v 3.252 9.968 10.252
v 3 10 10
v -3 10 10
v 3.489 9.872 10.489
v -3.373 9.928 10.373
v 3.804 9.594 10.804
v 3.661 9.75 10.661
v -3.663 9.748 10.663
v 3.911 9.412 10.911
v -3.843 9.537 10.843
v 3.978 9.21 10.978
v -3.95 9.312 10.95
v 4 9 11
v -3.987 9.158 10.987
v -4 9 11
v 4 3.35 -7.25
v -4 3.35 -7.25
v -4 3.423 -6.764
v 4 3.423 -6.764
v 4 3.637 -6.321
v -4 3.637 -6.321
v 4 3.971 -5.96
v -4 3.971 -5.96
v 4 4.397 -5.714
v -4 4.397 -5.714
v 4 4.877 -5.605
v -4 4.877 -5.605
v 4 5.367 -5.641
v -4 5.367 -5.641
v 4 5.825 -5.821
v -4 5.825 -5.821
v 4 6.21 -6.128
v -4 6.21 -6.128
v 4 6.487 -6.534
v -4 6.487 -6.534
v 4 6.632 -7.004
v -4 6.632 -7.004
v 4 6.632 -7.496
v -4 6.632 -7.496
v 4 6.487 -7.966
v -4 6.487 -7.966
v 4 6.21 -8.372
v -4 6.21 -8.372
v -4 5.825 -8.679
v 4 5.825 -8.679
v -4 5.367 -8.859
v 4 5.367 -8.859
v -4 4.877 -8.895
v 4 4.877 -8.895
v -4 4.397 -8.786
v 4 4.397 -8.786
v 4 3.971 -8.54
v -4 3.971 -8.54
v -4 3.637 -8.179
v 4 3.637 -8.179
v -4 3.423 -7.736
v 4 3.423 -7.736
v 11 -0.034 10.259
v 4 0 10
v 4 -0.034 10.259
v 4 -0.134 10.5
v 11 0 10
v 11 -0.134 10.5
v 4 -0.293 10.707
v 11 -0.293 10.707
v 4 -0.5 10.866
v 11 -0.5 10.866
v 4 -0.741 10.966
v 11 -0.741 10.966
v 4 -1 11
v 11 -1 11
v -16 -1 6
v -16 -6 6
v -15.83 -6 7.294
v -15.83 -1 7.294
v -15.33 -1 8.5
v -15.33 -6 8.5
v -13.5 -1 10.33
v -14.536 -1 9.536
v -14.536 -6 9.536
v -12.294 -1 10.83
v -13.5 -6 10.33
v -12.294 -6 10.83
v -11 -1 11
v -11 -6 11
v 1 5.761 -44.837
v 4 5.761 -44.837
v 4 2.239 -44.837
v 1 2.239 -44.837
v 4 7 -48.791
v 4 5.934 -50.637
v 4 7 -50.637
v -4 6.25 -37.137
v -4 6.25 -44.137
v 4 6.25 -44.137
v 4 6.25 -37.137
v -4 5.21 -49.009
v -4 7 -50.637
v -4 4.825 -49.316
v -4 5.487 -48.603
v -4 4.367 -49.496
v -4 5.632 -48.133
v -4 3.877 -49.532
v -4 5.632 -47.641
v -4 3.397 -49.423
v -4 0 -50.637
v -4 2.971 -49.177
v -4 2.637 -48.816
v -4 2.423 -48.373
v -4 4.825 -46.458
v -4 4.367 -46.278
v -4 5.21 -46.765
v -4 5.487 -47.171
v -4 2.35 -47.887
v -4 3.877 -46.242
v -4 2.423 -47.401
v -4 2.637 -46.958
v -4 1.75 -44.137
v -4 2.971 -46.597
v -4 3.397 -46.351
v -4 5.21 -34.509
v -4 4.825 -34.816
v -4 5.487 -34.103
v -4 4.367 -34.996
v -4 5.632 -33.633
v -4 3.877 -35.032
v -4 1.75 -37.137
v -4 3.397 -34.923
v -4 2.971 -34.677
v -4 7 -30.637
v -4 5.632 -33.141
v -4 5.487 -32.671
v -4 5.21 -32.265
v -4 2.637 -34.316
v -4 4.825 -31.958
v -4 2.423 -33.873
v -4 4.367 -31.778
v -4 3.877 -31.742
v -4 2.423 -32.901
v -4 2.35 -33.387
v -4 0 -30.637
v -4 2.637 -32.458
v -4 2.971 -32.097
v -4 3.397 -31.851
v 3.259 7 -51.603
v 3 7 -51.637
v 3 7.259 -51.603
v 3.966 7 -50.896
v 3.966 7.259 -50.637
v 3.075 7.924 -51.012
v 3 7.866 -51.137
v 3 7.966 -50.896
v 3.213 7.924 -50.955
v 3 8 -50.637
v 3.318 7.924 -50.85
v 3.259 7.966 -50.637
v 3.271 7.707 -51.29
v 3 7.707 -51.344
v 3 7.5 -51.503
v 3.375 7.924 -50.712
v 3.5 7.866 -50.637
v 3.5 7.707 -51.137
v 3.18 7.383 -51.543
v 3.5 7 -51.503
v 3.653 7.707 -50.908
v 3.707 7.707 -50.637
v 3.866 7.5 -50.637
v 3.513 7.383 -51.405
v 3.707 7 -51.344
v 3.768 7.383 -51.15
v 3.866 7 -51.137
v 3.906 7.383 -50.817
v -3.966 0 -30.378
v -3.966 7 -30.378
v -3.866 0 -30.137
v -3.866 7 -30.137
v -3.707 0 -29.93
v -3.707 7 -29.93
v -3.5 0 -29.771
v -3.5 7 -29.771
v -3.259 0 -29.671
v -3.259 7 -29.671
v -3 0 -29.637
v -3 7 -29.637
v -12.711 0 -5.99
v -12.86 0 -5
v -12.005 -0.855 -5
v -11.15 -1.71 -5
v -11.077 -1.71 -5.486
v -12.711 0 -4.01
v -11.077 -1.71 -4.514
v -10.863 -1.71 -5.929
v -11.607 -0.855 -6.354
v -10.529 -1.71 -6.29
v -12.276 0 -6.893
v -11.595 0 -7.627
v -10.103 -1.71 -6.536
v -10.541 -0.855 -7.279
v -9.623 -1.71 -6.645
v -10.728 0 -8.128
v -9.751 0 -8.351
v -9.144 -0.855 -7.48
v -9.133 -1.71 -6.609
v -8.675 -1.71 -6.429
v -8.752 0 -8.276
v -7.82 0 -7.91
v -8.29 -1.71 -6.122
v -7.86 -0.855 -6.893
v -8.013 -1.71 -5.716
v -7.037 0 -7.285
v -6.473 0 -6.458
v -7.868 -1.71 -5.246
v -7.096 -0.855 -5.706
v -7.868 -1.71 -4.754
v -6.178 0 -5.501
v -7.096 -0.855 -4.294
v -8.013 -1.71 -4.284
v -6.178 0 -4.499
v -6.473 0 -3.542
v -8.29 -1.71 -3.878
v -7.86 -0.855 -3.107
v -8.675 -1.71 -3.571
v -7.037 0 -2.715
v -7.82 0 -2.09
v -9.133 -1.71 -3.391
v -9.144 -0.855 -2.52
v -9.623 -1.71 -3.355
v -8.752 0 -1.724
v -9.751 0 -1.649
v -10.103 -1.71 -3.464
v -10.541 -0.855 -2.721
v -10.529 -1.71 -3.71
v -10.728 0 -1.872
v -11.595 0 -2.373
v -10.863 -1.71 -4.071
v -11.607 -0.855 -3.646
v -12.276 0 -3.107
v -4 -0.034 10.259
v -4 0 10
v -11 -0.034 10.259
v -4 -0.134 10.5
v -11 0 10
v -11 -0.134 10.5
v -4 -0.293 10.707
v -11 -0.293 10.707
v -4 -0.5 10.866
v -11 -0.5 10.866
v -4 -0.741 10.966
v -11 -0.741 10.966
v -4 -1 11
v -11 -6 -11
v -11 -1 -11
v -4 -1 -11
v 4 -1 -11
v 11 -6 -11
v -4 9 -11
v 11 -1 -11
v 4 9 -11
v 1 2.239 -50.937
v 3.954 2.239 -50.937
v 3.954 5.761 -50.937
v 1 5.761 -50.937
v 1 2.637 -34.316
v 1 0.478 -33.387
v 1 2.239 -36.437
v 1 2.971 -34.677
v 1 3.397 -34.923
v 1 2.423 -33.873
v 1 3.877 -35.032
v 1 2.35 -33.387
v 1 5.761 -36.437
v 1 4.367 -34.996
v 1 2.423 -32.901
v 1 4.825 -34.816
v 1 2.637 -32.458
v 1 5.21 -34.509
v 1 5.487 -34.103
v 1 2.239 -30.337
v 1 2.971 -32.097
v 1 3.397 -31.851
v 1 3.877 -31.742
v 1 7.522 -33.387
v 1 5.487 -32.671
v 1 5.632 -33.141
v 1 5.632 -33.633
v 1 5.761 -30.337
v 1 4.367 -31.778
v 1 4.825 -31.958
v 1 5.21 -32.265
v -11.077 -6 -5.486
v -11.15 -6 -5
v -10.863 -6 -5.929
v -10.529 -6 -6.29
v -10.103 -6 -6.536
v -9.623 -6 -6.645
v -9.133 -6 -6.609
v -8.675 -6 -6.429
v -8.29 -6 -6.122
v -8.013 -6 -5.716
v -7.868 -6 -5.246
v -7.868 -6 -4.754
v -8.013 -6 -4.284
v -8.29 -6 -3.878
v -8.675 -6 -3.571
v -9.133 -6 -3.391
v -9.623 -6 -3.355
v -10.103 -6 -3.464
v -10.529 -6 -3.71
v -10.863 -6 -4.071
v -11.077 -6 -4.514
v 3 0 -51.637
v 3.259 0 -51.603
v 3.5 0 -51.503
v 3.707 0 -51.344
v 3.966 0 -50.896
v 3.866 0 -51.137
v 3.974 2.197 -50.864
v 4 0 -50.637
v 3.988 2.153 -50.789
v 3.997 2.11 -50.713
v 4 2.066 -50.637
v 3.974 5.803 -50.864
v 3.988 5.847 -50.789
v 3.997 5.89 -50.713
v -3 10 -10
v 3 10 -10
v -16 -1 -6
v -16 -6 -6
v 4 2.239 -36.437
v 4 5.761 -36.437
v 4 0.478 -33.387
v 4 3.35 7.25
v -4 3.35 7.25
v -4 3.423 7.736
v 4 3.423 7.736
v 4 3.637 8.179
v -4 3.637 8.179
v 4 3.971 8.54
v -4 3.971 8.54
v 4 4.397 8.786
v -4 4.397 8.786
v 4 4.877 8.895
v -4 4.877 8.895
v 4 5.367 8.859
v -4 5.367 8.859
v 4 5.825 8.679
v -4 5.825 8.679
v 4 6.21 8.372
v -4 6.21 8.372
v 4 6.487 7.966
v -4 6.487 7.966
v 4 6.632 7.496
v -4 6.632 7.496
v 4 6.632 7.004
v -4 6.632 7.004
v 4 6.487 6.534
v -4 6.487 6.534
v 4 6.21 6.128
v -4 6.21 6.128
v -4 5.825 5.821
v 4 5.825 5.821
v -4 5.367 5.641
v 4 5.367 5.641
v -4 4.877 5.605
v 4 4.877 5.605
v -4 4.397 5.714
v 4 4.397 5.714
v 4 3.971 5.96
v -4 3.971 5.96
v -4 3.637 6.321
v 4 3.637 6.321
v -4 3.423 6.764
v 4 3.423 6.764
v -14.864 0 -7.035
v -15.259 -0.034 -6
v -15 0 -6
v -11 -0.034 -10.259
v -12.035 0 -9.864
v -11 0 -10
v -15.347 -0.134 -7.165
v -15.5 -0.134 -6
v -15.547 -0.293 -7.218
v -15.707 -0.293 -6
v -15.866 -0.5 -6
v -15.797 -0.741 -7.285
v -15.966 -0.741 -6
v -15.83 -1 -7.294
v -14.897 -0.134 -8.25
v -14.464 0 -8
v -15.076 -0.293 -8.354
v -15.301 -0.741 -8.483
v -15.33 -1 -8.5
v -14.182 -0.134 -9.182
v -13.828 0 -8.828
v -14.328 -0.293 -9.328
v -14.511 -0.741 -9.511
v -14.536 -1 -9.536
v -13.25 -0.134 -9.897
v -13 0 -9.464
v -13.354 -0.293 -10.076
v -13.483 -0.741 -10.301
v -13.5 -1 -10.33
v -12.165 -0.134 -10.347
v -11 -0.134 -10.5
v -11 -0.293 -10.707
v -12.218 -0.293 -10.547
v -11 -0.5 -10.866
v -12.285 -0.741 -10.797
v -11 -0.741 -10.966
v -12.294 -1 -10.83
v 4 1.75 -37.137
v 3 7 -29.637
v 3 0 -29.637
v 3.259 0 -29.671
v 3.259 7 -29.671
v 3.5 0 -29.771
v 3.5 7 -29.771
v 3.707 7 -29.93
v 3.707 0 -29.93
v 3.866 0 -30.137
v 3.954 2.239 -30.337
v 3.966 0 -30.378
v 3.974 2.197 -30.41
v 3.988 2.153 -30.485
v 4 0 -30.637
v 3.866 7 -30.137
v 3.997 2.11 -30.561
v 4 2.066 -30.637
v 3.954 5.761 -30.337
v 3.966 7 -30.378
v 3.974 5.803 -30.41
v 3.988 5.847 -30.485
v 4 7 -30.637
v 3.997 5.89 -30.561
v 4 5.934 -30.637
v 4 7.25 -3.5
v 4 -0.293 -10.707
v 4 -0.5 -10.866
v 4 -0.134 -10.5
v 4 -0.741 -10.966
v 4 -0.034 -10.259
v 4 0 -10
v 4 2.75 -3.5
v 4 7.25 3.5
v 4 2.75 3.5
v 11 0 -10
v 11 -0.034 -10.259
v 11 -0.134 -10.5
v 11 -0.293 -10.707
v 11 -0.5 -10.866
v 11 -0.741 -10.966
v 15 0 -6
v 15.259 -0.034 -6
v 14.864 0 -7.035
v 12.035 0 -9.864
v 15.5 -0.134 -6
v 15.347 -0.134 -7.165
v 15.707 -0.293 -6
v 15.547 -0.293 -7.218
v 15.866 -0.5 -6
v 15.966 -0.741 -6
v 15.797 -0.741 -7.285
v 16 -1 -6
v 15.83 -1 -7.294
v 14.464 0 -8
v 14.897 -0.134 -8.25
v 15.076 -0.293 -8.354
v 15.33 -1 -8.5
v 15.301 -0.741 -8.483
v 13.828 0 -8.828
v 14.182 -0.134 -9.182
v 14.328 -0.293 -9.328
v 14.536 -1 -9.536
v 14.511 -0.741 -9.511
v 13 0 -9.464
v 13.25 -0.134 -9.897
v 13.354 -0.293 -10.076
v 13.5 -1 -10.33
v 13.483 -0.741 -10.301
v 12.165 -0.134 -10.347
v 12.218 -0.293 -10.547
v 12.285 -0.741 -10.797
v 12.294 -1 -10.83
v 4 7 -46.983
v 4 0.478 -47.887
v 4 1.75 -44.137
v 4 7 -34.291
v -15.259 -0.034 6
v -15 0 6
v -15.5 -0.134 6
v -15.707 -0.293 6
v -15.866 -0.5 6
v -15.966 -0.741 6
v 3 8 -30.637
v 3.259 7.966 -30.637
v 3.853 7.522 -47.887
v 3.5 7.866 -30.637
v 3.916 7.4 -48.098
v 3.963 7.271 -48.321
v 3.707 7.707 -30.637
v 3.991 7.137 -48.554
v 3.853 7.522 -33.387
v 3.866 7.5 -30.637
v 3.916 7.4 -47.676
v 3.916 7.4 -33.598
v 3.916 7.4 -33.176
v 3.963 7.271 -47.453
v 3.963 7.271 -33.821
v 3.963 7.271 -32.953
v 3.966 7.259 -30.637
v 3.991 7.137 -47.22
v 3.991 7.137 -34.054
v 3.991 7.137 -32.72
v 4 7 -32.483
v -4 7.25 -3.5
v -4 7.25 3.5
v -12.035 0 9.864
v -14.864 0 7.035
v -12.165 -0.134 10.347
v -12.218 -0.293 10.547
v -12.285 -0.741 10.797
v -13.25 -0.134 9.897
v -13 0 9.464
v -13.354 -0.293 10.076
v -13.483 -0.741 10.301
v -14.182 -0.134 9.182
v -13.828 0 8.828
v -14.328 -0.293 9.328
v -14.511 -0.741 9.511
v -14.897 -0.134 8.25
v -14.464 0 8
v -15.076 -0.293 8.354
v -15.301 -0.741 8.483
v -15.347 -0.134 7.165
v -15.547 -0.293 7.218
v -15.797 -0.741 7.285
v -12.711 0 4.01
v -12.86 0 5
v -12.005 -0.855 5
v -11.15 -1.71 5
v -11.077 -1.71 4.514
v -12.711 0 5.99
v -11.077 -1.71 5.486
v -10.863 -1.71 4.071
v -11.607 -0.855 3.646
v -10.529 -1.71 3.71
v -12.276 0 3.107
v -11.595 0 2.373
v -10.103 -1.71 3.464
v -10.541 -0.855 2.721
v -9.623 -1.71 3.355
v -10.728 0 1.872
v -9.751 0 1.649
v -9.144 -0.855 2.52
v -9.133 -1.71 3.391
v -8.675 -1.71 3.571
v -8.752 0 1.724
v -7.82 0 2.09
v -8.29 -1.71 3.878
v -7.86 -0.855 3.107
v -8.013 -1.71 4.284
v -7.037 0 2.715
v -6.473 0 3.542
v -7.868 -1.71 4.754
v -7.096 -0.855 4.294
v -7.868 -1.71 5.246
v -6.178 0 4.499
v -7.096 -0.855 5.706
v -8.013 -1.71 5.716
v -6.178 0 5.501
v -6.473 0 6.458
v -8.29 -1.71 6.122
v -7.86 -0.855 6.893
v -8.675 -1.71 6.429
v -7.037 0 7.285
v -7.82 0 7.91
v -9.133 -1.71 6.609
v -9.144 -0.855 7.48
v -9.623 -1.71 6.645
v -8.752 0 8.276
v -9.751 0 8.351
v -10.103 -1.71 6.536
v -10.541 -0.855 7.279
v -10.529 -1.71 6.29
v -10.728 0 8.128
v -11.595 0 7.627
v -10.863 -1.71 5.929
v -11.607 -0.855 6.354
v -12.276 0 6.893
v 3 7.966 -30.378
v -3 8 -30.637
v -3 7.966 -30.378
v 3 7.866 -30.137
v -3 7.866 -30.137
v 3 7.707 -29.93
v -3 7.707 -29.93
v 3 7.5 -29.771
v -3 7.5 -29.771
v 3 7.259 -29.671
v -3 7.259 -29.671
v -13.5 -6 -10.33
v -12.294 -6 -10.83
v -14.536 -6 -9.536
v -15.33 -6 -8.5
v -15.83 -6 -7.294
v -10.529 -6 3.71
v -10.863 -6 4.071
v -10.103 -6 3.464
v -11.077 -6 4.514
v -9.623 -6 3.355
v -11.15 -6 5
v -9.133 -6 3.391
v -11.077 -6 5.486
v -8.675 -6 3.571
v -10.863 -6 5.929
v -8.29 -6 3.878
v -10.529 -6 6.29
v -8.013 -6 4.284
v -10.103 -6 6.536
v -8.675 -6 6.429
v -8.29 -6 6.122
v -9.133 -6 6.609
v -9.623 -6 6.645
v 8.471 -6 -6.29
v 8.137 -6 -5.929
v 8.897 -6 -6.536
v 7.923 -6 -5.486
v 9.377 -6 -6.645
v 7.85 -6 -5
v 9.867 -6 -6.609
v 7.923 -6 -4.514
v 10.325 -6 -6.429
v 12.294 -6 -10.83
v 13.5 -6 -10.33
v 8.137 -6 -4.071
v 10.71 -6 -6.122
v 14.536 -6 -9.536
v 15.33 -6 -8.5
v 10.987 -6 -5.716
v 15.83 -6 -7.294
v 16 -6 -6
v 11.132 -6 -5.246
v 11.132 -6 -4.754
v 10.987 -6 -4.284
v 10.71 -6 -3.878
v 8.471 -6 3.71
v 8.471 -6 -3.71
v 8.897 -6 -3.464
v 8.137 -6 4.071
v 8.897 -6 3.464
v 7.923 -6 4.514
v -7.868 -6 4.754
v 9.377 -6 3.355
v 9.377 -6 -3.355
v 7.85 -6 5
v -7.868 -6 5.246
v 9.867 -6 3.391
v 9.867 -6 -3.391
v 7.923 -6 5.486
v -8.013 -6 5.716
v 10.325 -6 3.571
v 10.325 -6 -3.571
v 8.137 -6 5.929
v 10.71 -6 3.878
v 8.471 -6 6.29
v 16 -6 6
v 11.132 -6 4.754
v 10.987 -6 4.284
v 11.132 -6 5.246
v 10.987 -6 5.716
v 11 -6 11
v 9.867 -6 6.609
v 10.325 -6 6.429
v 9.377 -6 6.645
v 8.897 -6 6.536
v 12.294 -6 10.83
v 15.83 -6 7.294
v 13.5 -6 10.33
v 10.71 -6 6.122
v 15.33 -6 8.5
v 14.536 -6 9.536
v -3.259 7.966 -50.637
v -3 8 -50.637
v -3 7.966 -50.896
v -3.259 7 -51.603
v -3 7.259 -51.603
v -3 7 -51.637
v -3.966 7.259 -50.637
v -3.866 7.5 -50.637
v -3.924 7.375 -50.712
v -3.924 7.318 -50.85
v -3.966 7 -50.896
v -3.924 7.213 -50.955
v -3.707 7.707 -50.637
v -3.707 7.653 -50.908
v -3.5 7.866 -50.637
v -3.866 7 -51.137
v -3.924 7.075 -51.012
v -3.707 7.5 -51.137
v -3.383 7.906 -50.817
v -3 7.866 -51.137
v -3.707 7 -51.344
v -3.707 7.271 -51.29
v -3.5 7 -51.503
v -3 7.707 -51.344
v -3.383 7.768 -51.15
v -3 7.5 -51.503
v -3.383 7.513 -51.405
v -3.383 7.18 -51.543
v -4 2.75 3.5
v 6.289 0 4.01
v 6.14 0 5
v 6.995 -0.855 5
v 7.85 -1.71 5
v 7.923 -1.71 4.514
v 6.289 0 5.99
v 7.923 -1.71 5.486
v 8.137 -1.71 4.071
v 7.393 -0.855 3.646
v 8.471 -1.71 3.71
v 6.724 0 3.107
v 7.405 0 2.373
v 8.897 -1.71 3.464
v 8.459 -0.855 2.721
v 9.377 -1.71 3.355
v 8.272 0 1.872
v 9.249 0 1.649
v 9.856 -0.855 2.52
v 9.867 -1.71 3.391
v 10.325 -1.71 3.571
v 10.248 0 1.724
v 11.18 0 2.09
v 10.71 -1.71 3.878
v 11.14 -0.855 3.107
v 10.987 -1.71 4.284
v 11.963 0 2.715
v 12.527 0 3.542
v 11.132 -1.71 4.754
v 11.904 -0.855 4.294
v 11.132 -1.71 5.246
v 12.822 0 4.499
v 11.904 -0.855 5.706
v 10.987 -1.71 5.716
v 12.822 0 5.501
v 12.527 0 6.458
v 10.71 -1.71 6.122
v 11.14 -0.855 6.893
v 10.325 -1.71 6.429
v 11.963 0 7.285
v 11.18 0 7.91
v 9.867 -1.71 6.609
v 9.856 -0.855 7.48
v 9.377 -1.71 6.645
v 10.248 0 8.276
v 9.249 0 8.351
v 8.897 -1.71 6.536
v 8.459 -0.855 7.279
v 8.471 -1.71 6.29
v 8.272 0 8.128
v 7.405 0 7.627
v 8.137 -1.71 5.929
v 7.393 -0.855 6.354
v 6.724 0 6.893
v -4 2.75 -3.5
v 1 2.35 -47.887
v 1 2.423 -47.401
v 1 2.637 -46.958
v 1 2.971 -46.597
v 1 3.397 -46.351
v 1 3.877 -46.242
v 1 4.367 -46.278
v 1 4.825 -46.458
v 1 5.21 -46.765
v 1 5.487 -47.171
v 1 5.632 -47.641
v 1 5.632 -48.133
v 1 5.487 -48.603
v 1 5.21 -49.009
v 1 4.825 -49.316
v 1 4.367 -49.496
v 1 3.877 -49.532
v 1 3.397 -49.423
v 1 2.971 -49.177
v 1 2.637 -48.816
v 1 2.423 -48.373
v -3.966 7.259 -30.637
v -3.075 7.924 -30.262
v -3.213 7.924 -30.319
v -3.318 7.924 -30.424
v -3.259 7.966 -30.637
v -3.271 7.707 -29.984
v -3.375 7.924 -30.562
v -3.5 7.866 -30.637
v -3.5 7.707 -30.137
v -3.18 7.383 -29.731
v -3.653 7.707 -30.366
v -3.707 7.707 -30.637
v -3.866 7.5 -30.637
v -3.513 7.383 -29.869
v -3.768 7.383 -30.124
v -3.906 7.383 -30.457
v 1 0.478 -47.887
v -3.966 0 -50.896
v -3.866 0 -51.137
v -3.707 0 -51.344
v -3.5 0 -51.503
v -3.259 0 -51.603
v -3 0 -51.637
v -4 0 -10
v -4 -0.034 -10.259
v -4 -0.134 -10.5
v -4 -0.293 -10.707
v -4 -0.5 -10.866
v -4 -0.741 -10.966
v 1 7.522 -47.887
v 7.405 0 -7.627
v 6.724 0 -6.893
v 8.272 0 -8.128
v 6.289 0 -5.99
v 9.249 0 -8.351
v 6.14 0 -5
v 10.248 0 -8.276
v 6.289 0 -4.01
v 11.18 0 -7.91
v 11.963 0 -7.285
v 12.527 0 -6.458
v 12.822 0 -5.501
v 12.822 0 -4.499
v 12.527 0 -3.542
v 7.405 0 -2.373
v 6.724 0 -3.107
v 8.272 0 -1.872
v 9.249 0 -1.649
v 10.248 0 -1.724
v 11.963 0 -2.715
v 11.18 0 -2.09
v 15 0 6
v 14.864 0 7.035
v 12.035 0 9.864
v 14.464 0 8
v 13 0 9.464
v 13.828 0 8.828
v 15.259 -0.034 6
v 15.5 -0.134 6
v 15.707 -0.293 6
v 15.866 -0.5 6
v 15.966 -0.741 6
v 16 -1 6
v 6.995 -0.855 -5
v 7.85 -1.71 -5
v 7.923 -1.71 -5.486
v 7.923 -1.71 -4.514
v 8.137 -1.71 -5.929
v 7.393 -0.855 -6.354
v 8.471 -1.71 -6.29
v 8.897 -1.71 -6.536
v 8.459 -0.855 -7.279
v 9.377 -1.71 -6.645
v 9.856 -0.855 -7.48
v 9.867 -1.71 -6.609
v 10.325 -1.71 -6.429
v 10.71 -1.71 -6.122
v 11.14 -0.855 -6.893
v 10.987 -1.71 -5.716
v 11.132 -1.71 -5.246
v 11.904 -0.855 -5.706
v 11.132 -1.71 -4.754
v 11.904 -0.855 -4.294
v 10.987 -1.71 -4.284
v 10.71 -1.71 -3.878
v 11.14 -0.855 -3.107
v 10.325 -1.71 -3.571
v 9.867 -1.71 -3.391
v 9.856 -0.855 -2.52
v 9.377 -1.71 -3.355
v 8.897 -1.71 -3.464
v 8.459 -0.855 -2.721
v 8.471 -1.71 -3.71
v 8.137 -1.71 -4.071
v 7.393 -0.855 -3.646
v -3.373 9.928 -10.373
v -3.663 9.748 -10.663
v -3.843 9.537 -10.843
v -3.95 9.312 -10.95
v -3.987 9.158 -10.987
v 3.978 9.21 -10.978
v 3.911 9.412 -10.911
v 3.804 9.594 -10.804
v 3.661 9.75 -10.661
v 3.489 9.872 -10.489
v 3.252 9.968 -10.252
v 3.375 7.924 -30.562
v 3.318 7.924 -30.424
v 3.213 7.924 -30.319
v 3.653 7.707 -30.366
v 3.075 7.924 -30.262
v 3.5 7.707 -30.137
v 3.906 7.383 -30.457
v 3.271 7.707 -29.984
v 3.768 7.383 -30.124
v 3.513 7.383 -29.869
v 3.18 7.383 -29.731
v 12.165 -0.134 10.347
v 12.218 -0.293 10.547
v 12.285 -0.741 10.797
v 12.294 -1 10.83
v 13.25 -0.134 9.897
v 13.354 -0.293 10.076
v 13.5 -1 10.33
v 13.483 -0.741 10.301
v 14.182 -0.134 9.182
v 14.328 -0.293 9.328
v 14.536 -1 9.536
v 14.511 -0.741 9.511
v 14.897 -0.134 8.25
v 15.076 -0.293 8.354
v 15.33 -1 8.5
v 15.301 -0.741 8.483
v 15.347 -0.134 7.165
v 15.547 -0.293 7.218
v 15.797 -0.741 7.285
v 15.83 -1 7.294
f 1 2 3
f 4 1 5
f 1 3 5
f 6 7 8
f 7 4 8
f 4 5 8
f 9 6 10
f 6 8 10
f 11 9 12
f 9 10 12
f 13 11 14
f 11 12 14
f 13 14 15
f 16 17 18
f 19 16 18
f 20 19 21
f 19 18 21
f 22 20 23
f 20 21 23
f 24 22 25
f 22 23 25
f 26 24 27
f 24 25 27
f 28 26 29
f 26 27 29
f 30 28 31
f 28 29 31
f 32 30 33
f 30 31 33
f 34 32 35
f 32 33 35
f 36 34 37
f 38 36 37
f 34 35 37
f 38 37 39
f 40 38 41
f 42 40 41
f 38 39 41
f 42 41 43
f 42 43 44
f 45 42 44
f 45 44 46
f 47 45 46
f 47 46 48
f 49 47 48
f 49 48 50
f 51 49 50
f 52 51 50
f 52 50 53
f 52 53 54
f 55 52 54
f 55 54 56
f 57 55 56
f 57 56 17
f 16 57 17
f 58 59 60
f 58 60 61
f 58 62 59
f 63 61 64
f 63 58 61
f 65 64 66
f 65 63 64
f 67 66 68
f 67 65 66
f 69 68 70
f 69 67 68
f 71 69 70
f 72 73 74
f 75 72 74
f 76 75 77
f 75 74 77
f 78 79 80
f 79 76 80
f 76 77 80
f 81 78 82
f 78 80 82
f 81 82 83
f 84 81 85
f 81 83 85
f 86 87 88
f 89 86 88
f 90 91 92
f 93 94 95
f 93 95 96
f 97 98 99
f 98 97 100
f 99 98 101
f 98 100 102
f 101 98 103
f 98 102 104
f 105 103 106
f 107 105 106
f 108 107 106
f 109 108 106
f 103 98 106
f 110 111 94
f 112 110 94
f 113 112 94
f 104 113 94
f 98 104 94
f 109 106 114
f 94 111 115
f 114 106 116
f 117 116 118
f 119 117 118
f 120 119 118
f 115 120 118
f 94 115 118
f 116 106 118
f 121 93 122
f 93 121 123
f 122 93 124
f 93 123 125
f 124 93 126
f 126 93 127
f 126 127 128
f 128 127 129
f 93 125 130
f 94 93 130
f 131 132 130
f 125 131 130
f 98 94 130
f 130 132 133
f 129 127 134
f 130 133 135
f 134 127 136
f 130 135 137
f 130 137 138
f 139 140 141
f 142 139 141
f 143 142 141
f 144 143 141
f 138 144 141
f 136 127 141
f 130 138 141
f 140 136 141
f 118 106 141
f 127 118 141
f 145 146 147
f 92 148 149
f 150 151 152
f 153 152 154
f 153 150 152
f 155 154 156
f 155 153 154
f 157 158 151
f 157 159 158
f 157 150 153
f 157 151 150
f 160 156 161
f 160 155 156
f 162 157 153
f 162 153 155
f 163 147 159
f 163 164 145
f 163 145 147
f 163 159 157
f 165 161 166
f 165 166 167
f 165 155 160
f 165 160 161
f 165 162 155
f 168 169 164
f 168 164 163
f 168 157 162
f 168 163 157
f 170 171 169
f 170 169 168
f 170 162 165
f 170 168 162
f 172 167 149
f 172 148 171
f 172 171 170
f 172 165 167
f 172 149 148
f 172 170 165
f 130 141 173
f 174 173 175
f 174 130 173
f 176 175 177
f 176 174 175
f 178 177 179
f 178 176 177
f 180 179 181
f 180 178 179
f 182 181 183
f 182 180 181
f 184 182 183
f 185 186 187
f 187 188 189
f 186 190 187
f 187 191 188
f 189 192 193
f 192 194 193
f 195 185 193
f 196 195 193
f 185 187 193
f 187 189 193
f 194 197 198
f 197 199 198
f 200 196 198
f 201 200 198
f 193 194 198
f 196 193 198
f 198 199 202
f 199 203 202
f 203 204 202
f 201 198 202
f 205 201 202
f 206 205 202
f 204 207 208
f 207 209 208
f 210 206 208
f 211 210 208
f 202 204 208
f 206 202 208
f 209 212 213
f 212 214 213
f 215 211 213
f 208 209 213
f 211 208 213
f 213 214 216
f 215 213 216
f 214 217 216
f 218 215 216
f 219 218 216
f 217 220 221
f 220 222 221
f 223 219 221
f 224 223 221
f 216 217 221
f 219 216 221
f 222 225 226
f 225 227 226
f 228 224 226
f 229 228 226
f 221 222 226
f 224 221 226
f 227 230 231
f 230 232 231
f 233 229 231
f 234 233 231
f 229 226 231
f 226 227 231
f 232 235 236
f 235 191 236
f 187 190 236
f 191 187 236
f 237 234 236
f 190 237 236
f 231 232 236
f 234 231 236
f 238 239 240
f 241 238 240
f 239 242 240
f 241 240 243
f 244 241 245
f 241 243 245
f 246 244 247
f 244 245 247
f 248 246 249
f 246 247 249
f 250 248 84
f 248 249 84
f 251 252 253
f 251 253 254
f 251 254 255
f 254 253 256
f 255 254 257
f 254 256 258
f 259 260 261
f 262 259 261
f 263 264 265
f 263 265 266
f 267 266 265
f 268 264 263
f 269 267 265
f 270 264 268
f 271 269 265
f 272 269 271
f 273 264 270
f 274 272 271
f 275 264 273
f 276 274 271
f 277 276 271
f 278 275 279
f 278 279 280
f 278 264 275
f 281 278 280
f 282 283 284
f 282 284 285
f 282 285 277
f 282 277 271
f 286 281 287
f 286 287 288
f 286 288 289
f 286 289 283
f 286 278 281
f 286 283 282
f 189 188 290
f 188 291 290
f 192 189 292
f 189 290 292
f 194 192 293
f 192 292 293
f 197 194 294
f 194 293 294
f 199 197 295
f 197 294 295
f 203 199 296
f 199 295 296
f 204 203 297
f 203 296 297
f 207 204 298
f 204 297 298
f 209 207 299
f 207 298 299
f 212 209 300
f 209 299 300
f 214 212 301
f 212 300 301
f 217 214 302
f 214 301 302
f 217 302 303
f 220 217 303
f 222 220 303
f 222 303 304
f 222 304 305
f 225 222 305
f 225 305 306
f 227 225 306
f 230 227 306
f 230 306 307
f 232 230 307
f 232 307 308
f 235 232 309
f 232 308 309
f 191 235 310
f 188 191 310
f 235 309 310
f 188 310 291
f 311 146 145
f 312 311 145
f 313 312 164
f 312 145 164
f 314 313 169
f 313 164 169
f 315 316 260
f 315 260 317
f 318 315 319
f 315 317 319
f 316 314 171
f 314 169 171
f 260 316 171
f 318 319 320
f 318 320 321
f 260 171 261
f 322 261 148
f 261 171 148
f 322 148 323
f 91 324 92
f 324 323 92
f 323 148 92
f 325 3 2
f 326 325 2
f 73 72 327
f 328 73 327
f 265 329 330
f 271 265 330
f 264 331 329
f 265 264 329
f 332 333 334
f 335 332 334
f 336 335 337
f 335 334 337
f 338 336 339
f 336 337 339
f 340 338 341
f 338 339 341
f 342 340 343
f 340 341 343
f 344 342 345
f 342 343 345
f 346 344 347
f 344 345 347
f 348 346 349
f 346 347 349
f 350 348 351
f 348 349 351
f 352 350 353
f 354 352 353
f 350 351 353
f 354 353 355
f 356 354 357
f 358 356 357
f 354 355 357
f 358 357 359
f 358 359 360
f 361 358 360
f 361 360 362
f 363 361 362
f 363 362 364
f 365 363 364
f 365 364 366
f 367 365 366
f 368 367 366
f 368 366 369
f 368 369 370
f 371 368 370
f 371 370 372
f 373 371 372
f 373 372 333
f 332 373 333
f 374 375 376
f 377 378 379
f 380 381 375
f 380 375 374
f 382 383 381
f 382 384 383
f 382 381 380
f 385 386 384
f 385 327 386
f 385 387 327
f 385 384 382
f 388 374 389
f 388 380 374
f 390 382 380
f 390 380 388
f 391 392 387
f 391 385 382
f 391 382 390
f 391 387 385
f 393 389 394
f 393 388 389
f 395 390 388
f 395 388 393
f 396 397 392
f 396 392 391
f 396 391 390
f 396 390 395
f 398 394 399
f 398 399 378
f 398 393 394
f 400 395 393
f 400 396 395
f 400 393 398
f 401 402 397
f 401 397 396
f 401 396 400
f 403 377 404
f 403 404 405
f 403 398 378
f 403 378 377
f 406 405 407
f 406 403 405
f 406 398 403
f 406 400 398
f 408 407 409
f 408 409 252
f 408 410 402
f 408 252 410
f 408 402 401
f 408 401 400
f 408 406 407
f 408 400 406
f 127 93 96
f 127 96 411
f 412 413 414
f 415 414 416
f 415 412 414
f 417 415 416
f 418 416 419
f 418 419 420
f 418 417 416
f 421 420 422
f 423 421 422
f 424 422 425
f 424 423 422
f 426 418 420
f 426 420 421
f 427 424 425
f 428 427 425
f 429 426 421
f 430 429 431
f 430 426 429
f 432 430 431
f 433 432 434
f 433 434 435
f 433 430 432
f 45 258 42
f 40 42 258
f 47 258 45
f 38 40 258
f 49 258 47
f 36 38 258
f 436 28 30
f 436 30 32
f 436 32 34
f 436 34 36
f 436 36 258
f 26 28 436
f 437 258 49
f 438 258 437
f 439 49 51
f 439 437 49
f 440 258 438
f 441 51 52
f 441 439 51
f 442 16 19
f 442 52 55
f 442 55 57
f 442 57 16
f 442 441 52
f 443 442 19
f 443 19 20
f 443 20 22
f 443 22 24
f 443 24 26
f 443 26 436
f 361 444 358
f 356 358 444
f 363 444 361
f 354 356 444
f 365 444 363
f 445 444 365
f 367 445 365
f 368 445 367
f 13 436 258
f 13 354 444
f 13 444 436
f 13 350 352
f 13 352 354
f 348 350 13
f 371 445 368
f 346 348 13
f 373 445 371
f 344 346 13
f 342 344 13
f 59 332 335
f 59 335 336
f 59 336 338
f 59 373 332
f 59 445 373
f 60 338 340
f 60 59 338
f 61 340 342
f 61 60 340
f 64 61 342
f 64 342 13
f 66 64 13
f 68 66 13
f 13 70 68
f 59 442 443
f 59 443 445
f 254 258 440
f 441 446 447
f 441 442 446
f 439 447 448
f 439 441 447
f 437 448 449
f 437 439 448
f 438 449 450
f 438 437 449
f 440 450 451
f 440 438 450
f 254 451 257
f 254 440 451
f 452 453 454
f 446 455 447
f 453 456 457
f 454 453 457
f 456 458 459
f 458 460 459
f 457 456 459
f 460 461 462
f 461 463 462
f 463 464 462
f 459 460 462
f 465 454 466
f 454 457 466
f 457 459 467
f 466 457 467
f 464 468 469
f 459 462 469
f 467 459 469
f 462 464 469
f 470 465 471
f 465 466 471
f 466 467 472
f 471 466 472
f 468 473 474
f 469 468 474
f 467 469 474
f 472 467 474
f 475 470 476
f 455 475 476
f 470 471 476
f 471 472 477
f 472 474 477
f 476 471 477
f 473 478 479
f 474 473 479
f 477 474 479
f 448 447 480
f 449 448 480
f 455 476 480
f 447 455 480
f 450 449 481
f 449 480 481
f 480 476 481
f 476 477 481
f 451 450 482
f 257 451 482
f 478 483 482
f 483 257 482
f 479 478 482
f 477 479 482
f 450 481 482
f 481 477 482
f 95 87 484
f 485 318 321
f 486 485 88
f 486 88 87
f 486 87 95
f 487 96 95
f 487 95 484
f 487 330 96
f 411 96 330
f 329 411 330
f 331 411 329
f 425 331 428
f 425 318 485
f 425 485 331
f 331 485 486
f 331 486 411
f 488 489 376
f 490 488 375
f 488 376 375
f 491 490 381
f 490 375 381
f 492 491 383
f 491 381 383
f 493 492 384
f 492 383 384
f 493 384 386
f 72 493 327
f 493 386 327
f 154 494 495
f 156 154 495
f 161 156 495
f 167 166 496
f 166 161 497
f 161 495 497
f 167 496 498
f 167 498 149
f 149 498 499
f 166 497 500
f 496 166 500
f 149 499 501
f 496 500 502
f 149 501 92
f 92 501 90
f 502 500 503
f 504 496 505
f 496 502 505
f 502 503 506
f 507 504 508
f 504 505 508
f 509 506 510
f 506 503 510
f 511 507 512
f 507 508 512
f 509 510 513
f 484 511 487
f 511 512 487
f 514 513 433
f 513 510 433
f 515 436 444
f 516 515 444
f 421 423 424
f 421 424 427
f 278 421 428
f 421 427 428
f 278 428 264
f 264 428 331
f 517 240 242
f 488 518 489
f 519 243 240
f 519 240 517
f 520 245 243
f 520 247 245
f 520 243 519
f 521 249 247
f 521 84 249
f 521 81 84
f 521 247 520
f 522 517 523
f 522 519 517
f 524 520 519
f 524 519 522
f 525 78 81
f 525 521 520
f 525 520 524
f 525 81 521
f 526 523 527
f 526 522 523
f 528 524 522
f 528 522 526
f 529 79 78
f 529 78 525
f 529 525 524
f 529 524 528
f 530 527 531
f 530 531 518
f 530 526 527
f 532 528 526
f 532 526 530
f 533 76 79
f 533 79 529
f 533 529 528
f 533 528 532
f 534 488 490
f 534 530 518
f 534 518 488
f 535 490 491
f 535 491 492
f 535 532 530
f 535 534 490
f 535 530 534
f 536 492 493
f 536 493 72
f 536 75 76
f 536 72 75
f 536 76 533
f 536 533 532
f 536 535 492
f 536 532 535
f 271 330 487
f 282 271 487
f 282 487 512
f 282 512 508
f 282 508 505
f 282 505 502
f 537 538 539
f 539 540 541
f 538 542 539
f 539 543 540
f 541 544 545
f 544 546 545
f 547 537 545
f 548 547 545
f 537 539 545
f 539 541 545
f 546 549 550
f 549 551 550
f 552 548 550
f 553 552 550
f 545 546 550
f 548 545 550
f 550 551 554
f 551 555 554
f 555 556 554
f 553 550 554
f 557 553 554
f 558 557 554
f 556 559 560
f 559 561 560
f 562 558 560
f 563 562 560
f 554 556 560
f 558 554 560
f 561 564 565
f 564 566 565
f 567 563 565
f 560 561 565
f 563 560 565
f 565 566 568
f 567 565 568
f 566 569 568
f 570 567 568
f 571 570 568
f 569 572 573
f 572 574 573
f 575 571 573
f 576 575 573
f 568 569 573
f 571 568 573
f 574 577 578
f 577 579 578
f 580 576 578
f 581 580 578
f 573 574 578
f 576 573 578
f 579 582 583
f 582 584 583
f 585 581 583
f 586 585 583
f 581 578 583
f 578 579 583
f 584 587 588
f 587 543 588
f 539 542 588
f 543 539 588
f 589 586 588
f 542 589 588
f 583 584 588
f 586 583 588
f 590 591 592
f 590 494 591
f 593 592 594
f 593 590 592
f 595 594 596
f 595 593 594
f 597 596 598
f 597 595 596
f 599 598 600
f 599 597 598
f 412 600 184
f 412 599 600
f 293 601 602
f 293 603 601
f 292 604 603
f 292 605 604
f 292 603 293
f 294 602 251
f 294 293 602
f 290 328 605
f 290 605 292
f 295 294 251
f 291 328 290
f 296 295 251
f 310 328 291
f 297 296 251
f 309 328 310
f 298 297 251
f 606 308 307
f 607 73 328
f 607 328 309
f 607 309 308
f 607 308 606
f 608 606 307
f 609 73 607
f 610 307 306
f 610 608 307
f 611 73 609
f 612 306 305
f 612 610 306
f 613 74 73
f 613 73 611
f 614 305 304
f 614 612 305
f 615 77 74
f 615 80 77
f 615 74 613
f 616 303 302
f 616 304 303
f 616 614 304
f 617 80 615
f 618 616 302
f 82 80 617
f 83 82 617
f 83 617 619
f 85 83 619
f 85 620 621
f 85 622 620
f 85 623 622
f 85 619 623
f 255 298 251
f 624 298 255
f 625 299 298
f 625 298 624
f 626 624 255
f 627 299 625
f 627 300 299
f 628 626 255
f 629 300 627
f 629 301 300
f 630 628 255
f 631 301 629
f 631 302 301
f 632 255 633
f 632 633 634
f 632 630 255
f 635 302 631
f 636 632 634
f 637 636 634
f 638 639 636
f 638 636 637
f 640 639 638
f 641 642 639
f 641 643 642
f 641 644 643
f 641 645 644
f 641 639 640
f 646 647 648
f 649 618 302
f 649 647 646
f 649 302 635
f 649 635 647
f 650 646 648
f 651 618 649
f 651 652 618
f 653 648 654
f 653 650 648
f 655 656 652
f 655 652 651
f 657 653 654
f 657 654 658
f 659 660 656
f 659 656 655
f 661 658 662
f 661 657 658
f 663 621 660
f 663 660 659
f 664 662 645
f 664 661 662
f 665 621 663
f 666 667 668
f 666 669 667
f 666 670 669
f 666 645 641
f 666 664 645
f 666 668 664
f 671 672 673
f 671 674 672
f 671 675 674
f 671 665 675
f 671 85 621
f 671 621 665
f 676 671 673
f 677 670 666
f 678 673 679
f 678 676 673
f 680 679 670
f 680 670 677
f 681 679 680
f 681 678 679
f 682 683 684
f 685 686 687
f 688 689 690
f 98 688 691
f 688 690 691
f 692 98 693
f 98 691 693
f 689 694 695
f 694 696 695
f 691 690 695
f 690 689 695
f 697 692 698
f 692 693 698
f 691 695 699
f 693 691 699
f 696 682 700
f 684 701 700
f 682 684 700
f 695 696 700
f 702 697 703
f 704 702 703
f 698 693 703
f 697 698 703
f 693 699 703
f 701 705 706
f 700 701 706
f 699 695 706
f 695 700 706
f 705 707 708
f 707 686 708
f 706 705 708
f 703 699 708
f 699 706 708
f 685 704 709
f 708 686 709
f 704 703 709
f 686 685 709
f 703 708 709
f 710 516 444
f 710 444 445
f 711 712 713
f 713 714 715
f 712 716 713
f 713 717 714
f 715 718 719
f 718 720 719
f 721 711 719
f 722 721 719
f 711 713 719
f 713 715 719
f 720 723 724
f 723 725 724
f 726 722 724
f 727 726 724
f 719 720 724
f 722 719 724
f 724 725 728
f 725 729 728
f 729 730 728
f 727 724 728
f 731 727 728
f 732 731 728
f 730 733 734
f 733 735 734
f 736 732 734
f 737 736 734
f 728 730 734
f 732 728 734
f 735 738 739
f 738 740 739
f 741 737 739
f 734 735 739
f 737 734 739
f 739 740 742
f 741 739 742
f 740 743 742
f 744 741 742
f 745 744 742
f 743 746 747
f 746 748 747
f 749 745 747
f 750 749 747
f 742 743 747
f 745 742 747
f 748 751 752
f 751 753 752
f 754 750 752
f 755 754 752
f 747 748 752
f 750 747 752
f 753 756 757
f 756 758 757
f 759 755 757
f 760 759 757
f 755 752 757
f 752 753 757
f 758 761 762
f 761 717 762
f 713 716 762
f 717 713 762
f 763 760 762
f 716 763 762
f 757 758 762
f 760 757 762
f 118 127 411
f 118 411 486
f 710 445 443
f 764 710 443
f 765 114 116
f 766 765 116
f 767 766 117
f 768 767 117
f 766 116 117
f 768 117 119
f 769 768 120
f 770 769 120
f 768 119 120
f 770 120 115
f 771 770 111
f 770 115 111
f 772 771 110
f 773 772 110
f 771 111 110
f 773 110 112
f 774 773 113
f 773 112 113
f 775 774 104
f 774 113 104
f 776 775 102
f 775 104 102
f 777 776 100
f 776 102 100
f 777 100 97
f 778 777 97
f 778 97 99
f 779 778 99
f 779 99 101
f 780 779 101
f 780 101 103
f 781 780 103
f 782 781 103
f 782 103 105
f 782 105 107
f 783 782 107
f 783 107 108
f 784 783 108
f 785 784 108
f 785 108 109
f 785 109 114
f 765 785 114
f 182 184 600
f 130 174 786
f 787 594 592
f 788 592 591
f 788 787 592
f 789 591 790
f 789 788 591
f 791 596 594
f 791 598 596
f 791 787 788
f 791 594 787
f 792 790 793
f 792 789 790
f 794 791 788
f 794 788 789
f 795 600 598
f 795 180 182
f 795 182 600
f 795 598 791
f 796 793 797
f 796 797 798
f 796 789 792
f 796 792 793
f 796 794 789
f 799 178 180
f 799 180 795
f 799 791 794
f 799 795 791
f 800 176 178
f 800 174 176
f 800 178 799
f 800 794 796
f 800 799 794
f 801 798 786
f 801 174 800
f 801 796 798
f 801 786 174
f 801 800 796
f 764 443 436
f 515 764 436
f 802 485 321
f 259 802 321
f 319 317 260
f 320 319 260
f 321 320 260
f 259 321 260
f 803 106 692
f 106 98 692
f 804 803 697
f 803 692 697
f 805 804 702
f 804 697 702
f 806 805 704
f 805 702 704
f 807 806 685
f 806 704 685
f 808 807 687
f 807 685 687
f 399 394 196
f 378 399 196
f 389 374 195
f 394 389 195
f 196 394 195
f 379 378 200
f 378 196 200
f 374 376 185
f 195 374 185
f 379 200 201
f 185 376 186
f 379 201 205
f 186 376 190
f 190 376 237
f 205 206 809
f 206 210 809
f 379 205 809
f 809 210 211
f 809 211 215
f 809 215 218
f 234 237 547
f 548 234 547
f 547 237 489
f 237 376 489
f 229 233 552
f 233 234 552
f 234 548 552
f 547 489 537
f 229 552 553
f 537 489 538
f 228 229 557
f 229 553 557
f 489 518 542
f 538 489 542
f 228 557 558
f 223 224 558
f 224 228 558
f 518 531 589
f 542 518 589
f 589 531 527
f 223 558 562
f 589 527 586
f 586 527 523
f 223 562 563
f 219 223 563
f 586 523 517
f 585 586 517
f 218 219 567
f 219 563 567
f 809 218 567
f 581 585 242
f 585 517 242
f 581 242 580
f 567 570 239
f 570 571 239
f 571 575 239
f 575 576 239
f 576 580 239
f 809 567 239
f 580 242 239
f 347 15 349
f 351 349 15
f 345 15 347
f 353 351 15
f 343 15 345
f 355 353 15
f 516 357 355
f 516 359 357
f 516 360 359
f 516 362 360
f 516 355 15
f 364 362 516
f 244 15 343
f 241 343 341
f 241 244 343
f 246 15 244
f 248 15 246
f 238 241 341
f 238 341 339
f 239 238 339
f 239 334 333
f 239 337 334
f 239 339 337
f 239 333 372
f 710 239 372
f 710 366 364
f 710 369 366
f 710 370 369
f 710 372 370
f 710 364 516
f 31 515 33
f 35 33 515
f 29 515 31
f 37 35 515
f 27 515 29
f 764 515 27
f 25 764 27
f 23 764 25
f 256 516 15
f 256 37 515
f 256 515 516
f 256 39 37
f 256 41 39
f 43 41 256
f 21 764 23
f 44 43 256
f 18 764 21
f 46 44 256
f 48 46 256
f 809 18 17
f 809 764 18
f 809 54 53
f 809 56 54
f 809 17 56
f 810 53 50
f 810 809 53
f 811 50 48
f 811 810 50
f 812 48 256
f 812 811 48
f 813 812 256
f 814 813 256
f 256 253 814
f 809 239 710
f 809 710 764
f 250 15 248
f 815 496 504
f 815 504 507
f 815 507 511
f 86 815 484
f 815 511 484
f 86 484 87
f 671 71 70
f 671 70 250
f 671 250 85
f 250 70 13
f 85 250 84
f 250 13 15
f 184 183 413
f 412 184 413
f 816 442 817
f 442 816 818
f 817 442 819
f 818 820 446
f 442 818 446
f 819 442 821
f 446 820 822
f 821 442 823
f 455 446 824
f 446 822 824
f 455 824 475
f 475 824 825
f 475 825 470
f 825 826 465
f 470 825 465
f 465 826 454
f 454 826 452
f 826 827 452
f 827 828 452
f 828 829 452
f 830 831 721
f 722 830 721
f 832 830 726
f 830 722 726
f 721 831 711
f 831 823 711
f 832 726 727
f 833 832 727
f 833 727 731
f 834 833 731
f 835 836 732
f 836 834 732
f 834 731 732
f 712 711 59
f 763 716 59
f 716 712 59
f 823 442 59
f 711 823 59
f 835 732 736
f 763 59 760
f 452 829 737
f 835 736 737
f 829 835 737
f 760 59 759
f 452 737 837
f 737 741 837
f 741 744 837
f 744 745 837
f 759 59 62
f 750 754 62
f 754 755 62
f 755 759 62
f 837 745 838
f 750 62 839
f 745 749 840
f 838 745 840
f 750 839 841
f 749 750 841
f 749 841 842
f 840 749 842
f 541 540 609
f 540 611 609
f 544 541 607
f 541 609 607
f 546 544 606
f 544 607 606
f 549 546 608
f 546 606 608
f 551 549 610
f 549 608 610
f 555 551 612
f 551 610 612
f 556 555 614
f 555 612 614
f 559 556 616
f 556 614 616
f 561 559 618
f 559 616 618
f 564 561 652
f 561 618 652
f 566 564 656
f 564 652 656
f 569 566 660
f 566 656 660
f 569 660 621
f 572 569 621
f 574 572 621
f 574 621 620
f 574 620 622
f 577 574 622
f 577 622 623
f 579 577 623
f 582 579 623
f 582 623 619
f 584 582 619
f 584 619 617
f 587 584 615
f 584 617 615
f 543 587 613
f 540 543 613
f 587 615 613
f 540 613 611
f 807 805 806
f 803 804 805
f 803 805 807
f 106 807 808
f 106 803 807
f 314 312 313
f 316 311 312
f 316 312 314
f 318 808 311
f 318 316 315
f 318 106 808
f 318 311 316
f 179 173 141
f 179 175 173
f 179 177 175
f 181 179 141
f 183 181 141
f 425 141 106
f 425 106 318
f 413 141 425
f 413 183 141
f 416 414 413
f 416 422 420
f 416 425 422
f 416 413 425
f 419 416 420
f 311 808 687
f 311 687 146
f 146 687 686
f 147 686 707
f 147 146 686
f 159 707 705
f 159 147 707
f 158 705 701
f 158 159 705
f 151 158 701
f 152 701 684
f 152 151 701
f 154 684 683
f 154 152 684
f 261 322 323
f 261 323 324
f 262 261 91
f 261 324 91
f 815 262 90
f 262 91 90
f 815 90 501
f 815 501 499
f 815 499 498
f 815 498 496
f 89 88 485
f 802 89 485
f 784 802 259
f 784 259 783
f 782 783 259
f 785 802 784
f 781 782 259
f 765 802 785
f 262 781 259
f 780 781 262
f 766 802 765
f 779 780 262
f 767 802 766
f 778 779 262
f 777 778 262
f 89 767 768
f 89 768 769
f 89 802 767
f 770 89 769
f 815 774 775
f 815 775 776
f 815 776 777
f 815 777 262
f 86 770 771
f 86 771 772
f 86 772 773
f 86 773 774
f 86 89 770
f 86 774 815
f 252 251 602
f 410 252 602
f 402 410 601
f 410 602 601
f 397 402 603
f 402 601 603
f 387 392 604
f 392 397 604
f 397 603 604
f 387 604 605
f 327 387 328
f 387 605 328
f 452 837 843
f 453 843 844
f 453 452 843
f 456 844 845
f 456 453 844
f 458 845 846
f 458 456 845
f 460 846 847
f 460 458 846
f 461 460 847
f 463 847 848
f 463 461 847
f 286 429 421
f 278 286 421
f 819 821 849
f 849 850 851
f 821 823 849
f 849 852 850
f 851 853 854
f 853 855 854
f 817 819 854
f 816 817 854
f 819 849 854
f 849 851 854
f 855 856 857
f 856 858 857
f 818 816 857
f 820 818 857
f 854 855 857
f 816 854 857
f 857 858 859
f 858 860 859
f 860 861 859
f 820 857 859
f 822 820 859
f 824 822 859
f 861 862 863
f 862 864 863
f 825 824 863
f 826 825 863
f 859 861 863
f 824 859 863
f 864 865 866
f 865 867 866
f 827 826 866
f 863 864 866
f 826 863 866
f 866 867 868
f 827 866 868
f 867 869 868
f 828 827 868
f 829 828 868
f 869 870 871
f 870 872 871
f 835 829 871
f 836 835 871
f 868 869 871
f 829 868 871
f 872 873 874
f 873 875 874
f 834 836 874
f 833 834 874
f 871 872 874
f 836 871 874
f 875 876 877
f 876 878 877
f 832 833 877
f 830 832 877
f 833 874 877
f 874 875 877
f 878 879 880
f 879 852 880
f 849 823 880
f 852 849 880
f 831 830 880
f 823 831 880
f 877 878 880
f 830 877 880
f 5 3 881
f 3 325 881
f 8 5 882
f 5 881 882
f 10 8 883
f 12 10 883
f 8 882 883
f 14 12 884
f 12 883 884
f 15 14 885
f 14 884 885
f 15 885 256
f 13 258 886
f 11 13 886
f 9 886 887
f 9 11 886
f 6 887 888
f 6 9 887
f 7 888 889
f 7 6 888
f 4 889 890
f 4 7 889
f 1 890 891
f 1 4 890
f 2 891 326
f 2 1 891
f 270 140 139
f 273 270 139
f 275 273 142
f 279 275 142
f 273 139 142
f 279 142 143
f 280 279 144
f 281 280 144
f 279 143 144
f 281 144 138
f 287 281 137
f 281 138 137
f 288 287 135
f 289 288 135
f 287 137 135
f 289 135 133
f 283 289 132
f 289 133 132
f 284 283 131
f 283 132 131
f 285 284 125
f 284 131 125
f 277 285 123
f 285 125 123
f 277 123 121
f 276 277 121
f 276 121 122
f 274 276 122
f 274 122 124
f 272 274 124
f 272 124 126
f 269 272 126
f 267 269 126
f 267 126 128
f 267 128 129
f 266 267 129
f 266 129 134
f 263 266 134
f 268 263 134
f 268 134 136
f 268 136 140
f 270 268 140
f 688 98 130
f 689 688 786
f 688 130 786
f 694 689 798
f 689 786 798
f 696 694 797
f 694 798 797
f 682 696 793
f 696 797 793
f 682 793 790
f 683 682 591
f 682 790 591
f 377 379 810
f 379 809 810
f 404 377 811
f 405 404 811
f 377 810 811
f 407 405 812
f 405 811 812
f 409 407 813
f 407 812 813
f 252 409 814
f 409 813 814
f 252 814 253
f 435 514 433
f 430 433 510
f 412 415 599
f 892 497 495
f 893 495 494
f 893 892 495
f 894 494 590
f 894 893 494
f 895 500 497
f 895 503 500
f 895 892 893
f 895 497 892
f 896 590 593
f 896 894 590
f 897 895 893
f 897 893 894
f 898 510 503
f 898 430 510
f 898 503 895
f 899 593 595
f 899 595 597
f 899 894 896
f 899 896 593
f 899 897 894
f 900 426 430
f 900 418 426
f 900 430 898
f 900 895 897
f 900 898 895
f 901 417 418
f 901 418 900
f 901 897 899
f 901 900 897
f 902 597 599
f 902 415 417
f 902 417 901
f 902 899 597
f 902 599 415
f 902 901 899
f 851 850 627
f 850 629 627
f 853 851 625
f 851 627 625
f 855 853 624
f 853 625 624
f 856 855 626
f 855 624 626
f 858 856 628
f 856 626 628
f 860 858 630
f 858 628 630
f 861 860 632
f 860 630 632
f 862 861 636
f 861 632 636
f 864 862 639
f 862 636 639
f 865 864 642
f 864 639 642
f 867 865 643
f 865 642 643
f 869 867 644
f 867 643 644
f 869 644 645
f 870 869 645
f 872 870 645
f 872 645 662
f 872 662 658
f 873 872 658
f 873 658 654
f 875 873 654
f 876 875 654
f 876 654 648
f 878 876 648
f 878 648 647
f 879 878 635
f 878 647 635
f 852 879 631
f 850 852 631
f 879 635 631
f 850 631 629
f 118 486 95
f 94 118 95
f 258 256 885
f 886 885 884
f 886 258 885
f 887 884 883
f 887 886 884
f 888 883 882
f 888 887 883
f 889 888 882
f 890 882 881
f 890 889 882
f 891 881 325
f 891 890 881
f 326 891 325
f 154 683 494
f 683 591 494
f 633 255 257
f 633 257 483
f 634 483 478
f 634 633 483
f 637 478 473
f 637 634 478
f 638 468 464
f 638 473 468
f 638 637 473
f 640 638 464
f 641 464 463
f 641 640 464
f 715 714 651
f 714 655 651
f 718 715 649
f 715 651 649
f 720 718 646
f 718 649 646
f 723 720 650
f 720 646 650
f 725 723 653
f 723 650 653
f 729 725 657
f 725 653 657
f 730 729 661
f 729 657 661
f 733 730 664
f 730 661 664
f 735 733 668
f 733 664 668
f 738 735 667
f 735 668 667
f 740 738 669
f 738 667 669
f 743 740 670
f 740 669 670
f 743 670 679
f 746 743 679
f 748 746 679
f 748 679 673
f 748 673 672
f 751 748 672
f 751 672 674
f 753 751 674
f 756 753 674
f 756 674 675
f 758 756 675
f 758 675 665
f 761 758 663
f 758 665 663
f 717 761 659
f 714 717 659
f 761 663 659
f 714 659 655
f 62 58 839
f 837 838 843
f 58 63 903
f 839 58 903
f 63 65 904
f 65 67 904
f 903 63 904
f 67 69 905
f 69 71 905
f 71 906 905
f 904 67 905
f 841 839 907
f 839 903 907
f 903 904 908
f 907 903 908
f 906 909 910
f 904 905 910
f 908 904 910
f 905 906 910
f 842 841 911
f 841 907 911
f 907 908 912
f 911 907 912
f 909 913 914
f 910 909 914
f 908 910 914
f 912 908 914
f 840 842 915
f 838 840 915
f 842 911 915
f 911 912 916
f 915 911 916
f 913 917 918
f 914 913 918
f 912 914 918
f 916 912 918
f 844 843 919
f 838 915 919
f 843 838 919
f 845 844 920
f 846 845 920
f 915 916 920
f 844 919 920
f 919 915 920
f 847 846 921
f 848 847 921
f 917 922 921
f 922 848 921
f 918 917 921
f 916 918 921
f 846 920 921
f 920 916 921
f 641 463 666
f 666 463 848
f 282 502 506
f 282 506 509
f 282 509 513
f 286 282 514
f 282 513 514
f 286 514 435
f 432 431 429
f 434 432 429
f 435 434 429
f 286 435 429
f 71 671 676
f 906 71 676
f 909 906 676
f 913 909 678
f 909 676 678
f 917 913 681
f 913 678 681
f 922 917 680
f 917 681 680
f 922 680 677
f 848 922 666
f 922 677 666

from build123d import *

# Parameters (mm, degrees)
F1_DEPTH       = 6
F2_DEPTH       = 10
F3_DEPTH       = 6
F4_D           = 3.3
F4_CSINK_D     = 6.72
F4_CSINK_ANGLE = 90
F5_R           = 5
F6_R           = 1
F7_W           = 2.25
F7_H           = 3.5
F8_DEPTH       = 25
F9_D           = 3.3
F10_R          = 1
F11_W          = 8
F11_H          = 22
F12_DEPTH      = 8
F14_D          = 3.3
F13_W          = 2.25
F13_H          = 3.5
F15_DEPTH      = 25
F16_R          = 1
F17_DEPTH      = 3


with BuildPart() as f1:
    # F0 (on Front) → F1 (new body)
    with BuildSketch(Plane.XZ):
        Polygon((-16, 11), (-16, -11), (-4, -11), (-4, 0), (-4, 11), align=None)
        with BuildLine():
            ThreePointArc((-7.4, -5), (-10.9849242405, -6.4849242405), (-9.5, -2.9))
            ThreePointArc((-9.5, -2.9), (-8.0150757595, -3.5150757595), (-7.4, -5))
        make_face(mode=Mode.SUBTRACT)
        with BuildLine():
            ThreePointArc((-7.4, 5), (-8.0150757595, 3.5150757595), (-9.5, 2.9))
            ThreePointArc((-9.5, 2.9), (-10.9849242405, 6.4849242405), (-7.4, 5))
        make_face(mode=Mode.SUBTRACT)
        with BuildLine():
            ThreePointArc((-7.4, 5), (-10.9849242405, 6.4849242405), (-9.5, 2.9))
            ThreePointArc((-9.5, 2.9), (-8.0150757595, 3.5150757595), (-7.4, 5))
        make_face()
        with BuildLine():
            ThreePointArc((-7.4, -5), (-8.0150757595, -3.5150757595), (-9.5, -2.9))
            ThreePointArc((-9.5, -2.9), (-10.9849242405, -6.4849242405), (-7.4, -5))
        make_face()
    extrude(amount=F1_DEPTH)



with BuildPart() as f1b:
    # F0 (on Front) → F1, piece 2 (new body)
    with BuildSketch(Plane.XZ):
        Polygon((4, 0), (4, -11), (16, -11), (16, 11), (4, 11), align=None)
        with BuildLine():
            ThreePointArc((11.6, -5), (8.0150757595, -6.4849242405), (9.5, -2.9))
            ThreePointArc((9.5, -2.9), (10.9849242405, -3.5150757595), (11.6, -5))
        make_face(mode=Mode.SUBTRACT)
        with BuildLine():
            ThreePointArc((11.6, 5), (10.9849242405, 3.5150757595), (9.5, 2.9))
            ThreePointArc((9.5, 2.9), (8.0150757595, 6.4849242405), (11.6, 5))
        make_face(mode=Mode.SUBTRACT)
        with BuildLine():
            ThreePointArc((11.6, 5), (8.0150757595, 6.4849242405), (9.5, 2.9))
            ThreePointArc((9.5, 2.9), (10.9849242405, 3.5150757595), (11.6, 5))
        make_face()
        with BuildLine():
            ThreePointArc((11.6, -5), (10.9849242405, -3.5150757595), (9.5, -2.9))
            ThreePointArc((9.5, -2.9), (8.0150757595, -6.4849242405), (11.6, -5))
        make_face()
    extrude(amount=F1_DEPTH)


with BuildPart() as f1_1:
    add(f1.part)

    add(f1b.part)  # F2 merges F1b
    # F0 (on Front) → F2 (join)
    with BuildSketch(Plane.XZ):
        Polygon((-4, 0), (-4, -11), (4, -11), (4, 0), (4, 11), (-4, 11), align=None)
    extrude(amount=-F2_DEPTH)

    # F0 (on Front) → F3 (join)
    with BuildSketch(Plane.XZ):
        Polygon((-4, 0), (-4, -11), (4, -11), (4, 0), (4, 11), (-4, 11), align=None)
    extrude(amount=F3_DEPTH)

    # F4 (through all)
    with Locations(Plane(origin=(0, 0, 0), x_dir=(1, 0, 0), z_dir=(0, 1, 0))):
        with Locations((9.5, -5), (9.5, 5), (-9.5, -5), (-9.5, 5)):
            CounterSinkHole(F4_D / 2, F4_CSINK_D / 2, counter_sink_angle=F4_CSINK_ANGLE)

    # F5
    f5_edges = [f1_1.edges().sort_by_distance(p)[0] for p in [
        (-16, -3, 11),
        (-16, -3, -11),
        (16, -3, 11),
        (16, -3, -11),
    ]]
    fillet(f5_edges, radius=F5_R)

    # F6
    f6_edges = [f1_1.edges().sort_by_distance(p)[0] for p in [
        (-7.5, 0, 11),
        (14.535534, 0, 9.535534),
    ]]
    fillet(f6_edges, radius=F6_R)

    # F7 (on face) → F8 (cut)
    with BuildSketch(Plane.YZ.offset(4)):
        with Locations((6.125, 1.75)):
            Rectangle(F7_W, F7_H)
        with Locations((6.125, -1.75)):
            Rectangle(F7_W, F7_H)
        Polygon((5, 0), (5, 3.5), (2.75, 3.5), (2.75, 0), (2.75, -3.5), (5, -3.5), align=None)
    extrude(amount=-F8_DEPTH, mode=Mode.SUBTRACT)

    # F9 (through all)
    with Locations(Plane.YZ.offset(4)):
        with Locations((5, 7.25), (5, -7.25)):
            Hole(F9_D / 2)

    # F10
    f10_edges = [f1_1.edges().sort_by_distance(p)[0] for p in [
        (4, 10, 0),
        (0, 10, 11),
        (-4, 10, 0),
        (0, 10, -11),
    ]]
    fillet(f10_edges, radius=F10_R)


with BuildPart() as f12:
    # F11 (on Front) → F12 (new body)
    with BuildSketch(Plane.XZ):
        with Locations((0, -40.6370076567)):
            Rectangle(F11_W, F11_H)
    extrude(amount=-F12_DEPTH)

    # F14 (through all)
    with Locations(Plane.YZ.offset(4)):
        with Locations((4, -33.3870076567), (4, -47.8870076567)):
            Hole(F14_D / 2)

    # F13 (on face) → F15 (cut)
    with BuildSketch(Plane.YZ.offset(4)):
        Polygon((4, -40.6370076567), (4, -37.1370076567), (1.75, -37.1370076567), (1.75, -40.6370076567), (1.75, -44.1370076567), (4, -44.1370076567), align=None)
        with Locations((5.125, -42.3870076567)):
            Rectangle(F13_W, F13_H)
        with Locations((5.125, -38.8870076567)):
            Rectangle(F13_W, F13_H)
    extrude(amount=-F15_DEPTH, mode=Mode.SUBTRACT)

    # F16
    f16_edges = [f12.edges().sort_by_distance(p)[0] for p in [
        (4, 4, -29.637008),
        (-4, 4, -29.637008),
        (4, 4, -51.637008),
        (0, 8, -51.637008),
        (4, 8, -40.637008),
        (0, 8, -29.637008),
        (-4, 8, -40.637008),
        (-4, 4, -51.637008),
    ]]
    fillet(f16_edges, radius=F16_R)

    # F13 (on face) → F17 (cut)
    with BuildSketch(Plane.YZ.offset(4)):
        Polygon((4, -30.3370076567), (4, -36.4370076567), (5.760918321, -36.4370076567), (7.5218366421, -33.3870076567), (5.760918321, -30.3370076567), align=None)
        Polygon((2.239081679, -36.4370076567), (4, -36.4370076567), (4, -30.3370076567), (2.239081679, -30.3370076567), (0.4781633579, -33.3870076567), align=None)
        Polygon((5.760918321, -44.8370076567), (4, -44.8370076567), (4, -50.9370076567), (5.760918321, -50.9370076567), (7.5218366421, -47.8870076567), align=None)
        Polygon((4, -50.9370076567), (4, -44.8370076567), (2.239081679, -44.8370076567), (0.4781633579, -47.8870076567), (2.239081679, -50.9370076567), align=None)
    extrude(amount=-F17_DEPTH, mode=Mode.SUBTRACT)


solid = Compound([f1_1.part, f12.part])
